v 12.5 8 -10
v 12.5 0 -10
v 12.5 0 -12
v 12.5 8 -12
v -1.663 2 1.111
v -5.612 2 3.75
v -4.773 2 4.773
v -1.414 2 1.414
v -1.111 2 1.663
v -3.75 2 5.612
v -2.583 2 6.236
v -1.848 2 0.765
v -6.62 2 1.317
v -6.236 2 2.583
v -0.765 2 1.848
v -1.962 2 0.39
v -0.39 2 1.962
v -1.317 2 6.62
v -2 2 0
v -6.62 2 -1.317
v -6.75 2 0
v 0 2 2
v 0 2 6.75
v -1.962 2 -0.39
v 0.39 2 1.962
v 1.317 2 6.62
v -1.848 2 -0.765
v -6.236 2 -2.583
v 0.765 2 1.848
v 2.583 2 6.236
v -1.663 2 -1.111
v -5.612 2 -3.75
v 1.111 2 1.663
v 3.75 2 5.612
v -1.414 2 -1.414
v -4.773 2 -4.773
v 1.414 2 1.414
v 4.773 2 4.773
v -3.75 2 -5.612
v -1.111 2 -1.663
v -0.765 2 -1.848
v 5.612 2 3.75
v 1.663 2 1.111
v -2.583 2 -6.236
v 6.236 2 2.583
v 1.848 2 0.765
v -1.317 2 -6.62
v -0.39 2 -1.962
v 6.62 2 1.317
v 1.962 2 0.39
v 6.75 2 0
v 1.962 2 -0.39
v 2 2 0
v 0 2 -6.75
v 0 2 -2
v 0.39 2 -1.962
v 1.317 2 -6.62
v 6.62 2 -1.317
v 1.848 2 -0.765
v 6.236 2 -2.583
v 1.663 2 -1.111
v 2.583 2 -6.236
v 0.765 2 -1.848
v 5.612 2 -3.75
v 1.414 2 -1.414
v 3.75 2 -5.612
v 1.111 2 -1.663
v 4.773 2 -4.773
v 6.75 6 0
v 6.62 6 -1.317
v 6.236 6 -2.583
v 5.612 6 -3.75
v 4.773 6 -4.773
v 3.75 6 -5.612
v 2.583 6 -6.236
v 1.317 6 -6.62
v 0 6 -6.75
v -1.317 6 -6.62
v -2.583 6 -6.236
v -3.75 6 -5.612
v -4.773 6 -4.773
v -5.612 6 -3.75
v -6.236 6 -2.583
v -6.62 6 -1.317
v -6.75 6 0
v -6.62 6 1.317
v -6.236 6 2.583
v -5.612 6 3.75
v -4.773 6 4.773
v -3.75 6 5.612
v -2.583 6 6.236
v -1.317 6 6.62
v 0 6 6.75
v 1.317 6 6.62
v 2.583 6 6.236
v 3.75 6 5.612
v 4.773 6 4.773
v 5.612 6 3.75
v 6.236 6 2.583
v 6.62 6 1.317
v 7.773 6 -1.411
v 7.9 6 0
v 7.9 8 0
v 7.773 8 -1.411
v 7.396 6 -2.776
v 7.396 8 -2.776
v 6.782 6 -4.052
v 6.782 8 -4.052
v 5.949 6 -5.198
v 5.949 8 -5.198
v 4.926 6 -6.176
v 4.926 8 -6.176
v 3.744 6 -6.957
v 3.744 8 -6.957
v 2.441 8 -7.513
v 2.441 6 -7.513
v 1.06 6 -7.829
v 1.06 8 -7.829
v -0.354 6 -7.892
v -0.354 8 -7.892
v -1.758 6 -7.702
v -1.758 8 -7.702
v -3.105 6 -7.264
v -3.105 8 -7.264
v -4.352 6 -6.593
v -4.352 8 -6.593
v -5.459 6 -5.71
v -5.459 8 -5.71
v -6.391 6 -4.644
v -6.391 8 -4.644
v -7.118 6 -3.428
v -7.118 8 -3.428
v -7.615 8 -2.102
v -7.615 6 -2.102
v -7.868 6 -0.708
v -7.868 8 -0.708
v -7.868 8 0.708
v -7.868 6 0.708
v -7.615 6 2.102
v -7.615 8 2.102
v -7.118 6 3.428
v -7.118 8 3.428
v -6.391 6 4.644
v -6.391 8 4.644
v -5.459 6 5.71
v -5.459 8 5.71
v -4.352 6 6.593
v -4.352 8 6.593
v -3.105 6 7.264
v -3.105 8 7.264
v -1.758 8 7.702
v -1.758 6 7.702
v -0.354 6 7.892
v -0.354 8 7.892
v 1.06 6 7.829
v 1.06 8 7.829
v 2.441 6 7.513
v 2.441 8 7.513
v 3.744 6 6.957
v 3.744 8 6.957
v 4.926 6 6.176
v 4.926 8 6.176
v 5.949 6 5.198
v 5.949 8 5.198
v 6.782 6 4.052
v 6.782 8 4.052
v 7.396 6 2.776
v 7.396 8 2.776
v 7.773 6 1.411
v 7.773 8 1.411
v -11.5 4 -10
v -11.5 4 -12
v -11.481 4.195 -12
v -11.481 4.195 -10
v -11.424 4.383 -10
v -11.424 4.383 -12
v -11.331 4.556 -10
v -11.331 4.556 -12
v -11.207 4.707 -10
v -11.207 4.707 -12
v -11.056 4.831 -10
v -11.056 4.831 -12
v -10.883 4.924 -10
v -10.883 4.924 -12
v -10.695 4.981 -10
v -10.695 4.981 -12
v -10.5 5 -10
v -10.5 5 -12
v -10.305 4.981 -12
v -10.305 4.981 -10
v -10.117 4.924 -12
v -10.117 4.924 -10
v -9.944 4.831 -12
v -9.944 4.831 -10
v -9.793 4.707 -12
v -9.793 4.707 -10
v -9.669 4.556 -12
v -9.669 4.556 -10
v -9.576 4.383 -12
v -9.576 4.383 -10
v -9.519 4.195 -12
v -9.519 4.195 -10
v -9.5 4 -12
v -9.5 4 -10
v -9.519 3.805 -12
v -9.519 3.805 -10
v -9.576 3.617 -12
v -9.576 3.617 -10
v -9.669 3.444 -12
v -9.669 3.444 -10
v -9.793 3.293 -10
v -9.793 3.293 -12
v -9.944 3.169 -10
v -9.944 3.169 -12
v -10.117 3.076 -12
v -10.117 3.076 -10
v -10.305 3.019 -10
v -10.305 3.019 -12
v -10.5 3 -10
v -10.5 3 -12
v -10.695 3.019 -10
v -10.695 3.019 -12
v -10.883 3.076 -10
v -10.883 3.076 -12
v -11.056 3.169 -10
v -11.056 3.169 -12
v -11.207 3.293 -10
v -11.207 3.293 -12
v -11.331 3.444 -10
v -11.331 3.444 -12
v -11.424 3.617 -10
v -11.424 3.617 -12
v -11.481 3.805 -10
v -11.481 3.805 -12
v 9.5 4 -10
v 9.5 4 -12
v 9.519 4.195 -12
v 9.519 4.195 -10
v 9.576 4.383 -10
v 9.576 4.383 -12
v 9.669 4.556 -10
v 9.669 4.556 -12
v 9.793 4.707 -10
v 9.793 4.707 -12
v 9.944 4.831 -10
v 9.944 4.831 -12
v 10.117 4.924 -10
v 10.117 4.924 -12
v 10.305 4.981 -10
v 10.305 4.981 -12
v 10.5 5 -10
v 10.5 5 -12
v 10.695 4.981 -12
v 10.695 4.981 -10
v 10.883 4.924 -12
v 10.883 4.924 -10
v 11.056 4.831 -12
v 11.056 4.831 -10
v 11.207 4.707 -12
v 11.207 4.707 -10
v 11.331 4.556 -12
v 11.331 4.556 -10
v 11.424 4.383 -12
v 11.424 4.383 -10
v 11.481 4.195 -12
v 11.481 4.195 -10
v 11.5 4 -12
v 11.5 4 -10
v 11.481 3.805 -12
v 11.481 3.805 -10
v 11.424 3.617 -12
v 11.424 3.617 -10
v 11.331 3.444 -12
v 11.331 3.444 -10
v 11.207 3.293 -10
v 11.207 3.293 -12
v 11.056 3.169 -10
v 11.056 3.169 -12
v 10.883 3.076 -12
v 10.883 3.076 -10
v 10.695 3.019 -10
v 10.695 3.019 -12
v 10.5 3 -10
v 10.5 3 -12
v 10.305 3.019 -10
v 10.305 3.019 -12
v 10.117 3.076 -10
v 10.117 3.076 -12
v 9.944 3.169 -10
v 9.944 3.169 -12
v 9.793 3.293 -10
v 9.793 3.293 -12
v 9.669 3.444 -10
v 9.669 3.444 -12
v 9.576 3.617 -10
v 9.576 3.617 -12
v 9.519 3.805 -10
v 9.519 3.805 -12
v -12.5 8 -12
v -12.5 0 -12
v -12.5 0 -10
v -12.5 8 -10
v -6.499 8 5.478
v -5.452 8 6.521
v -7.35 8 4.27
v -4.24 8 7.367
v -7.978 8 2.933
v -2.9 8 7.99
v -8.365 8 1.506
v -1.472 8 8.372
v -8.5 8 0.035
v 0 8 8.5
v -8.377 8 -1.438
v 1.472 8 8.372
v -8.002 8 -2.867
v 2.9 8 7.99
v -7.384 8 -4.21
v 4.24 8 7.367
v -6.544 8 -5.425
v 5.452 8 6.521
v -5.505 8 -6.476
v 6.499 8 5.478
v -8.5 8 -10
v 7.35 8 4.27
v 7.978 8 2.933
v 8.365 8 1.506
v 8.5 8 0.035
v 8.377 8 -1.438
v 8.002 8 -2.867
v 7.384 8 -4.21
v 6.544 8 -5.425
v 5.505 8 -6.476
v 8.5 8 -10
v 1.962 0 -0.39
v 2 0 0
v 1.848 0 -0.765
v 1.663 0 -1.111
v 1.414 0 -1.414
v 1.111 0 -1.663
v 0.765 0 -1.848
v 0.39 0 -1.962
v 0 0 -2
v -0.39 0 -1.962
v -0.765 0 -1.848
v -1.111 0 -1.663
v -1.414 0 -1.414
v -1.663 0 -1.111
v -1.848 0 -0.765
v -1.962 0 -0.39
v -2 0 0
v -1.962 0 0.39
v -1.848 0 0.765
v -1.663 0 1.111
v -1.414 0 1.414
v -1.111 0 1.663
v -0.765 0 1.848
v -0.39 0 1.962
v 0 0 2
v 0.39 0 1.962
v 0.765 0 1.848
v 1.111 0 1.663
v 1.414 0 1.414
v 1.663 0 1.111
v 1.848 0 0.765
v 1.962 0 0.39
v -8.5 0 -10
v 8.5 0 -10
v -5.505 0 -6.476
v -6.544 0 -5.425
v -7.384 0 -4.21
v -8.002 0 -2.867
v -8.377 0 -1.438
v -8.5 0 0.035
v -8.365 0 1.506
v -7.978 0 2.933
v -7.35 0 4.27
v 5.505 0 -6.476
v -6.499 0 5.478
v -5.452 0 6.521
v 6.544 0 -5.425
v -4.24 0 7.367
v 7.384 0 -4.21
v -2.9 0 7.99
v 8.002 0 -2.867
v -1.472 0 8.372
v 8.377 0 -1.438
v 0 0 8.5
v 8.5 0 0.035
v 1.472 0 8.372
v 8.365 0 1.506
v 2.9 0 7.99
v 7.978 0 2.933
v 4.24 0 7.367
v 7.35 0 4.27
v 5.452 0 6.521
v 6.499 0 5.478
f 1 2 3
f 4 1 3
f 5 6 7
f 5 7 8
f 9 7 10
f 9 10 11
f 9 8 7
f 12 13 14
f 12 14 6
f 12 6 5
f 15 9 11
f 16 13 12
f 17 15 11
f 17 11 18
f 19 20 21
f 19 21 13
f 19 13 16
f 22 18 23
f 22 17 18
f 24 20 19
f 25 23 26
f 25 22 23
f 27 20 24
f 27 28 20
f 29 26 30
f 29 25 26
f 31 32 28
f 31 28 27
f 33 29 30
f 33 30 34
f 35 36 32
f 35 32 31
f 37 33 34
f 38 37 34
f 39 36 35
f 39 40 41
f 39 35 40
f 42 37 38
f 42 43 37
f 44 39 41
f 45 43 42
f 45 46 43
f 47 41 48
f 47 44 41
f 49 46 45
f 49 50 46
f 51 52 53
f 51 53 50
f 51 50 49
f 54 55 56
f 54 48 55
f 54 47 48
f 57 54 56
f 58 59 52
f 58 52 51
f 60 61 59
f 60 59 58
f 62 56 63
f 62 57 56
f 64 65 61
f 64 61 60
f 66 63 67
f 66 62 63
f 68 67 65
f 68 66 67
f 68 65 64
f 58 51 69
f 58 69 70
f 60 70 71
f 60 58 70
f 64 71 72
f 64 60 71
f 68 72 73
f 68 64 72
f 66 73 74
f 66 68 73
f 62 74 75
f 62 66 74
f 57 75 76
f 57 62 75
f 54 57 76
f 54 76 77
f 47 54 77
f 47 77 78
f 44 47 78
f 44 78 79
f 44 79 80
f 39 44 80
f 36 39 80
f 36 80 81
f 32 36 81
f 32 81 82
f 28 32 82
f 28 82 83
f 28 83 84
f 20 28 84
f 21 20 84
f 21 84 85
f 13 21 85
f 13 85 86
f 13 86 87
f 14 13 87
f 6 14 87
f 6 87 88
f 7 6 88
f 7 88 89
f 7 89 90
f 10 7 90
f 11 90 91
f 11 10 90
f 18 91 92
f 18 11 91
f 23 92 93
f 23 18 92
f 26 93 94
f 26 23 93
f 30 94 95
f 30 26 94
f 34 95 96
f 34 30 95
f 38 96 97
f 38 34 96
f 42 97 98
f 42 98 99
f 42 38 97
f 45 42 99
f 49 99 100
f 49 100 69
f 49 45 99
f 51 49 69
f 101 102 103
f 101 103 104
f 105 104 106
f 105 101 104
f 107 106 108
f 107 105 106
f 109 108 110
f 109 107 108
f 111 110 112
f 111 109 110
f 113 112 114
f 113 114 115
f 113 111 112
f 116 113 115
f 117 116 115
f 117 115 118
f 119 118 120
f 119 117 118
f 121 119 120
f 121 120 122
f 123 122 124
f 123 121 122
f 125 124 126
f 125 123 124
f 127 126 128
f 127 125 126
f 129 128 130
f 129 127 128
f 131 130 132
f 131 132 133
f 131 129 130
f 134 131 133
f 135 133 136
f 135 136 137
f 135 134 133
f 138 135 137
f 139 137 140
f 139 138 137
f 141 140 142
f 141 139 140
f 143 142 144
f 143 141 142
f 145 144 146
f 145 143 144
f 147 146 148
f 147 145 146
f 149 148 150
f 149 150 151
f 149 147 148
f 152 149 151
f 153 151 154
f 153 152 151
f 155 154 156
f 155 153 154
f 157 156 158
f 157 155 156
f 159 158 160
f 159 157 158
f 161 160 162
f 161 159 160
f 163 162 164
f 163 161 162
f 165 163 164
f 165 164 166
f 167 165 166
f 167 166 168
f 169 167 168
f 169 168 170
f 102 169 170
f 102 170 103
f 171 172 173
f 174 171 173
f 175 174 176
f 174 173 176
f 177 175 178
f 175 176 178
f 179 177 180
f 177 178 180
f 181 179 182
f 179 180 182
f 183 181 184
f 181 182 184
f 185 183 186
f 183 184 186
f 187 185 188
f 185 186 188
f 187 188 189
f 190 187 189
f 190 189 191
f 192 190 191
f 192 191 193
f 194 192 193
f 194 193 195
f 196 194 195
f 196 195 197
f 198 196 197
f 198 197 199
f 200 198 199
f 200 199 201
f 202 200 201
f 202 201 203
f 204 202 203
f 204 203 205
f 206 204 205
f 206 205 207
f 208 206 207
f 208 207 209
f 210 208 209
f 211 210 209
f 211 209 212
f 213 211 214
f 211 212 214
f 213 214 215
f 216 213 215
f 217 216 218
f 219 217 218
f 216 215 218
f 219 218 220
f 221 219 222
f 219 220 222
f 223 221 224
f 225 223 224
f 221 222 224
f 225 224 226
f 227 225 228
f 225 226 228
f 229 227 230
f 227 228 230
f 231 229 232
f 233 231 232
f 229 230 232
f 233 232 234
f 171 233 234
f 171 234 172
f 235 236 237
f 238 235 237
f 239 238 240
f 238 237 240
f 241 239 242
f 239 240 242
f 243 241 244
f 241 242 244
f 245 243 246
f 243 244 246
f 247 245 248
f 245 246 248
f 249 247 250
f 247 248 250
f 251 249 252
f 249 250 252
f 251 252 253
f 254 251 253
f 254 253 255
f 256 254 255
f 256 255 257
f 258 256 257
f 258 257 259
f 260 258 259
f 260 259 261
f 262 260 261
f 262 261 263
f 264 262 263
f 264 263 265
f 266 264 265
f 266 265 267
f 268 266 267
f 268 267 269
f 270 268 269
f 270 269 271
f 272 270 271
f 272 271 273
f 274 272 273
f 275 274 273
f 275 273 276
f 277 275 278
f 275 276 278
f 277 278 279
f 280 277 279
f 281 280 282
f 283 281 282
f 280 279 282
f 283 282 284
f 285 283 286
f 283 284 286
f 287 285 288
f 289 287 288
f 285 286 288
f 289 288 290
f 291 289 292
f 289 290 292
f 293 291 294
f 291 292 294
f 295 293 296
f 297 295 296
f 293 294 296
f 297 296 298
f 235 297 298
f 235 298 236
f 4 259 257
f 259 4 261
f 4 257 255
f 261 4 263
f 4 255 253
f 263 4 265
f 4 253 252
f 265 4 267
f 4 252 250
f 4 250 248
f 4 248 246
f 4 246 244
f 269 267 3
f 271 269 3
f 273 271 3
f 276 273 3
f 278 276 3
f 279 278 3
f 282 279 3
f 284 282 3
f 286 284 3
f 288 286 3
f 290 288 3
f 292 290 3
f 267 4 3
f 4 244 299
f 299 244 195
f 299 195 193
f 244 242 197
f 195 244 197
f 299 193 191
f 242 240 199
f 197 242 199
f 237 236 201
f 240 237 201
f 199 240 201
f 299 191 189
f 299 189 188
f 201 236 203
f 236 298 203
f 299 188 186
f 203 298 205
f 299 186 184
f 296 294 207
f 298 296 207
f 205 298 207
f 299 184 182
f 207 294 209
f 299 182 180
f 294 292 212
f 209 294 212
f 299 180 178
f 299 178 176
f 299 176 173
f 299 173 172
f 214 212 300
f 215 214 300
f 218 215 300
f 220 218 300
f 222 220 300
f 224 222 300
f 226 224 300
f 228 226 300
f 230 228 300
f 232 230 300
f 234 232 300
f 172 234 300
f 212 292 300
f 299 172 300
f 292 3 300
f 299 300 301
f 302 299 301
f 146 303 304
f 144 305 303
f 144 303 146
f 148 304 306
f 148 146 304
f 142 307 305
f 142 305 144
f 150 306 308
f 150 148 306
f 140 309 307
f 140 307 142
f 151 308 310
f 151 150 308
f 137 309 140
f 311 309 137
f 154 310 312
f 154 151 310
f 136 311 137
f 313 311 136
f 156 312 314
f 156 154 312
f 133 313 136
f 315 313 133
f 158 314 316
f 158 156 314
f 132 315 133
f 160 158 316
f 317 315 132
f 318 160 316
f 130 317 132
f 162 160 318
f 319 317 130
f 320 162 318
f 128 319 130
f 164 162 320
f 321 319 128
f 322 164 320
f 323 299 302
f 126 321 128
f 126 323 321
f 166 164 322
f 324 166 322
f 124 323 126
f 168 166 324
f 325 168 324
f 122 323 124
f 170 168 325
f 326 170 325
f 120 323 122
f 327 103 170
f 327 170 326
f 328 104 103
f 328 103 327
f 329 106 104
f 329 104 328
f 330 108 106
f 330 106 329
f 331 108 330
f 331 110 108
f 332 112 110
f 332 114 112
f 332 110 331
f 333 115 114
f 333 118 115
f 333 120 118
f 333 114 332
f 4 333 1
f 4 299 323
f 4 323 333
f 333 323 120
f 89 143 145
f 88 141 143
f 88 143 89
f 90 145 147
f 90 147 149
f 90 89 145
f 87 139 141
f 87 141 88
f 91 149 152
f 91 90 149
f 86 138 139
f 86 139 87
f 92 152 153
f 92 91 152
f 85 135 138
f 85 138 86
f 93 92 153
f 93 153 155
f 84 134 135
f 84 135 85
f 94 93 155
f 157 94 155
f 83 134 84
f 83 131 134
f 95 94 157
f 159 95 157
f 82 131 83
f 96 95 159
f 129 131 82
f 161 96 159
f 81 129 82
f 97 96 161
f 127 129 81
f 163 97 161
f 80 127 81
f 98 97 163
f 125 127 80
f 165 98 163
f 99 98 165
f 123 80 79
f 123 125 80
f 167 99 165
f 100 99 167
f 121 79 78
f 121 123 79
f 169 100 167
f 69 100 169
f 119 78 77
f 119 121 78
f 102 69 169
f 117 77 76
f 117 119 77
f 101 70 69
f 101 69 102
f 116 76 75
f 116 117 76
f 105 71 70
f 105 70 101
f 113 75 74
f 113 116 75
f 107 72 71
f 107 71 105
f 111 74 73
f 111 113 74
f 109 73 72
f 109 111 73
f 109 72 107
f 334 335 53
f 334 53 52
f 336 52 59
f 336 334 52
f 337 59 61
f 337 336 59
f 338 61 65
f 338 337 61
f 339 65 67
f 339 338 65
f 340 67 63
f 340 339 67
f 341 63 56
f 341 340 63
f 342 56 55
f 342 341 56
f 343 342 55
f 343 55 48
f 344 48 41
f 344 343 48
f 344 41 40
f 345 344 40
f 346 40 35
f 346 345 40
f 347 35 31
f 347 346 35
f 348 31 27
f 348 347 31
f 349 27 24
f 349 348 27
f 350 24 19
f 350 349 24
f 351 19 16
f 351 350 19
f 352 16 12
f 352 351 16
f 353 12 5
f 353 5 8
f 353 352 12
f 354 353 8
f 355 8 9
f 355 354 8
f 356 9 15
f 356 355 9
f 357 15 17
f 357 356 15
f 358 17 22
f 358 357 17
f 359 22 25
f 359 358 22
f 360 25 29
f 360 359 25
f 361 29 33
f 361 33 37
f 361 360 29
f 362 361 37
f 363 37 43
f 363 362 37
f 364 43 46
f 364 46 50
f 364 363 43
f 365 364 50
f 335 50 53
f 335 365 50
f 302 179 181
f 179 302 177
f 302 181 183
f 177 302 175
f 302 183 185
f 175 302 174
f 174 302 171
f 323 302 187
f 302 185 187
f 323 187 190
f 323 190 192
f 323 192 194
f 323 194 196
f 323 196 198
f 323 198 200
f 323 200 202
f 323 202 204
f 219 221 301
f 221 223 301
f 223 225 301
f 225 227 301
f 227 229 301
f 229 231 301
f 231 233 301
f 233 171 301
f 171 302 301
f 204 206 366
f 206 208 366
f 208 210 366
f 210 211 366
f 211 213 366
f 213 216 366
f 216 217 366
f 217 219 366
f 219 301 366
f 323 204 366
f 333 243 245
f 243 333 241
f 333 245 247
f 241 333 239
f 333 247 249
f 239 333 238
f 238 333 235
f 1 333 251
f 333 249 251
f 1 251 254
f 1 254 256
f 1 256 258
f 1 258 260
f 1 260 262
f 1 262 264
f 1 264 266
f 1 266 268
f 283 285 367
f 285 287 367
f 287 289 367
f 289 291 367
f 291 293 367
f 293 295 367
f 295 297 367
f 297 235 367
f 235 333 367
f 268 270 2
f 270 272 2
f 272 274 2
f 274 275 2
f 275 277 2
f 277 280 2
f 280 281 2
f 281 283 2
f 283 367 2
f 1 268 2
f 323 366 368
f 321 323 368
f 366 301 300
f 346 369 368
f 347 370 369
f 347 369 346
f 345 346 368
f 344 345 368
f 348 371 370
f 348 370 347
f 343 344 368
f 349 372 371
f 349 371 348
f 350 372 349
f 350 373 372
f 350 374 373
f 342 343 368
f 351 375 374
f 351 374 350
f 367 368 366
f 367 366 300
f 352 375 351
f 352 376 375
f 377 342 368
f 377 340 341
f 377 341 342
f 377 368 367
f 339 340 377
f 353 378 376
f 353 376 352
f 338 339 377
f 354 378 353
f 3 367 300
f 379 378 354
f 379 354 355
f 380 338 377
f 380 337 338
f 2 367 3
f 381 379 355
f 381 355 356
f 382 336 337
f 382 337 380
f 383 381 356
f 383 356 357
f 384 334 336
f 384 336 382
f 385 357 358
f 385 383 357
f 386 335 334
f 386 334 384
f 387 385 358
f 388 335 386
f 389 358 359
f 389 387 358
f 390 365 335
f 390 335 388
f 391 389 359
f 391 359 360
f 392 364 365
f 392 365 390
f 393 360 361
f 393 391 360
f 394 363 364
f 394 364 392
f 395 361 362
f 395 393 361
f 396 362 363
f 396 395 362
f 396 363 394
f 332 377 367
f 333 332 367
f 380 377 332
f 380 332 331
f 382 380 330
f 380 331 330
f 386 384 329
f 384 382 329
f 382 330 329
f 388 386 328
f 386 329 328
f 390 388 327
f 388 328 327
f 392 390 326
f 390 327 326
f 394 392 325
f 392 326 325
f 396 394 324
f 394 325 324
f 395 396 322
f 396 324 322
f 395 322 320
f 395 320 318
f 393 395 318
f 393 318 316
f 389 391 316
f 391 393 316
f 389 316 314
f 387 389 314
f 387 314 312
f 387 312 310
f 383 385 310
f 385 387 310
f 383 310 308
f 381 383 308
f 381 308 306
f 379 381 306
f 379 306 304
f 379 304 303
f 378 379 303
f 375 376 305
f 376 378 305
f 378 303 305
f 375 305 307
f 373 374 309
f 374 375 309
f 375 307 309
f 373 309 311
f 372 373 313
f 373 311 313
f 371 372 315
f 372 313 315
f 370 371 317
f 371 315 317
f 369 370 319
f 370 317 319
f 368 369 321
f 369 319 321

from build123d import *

# Parameters (mm, degrees)
SKETCH_1_R          = 8
SKETCH_1_R_2        = 6.75
EXTRUDE_2_DEPTH     = 6
SKETCH_2_R          = 6.75
SKETCH_2_R_2        = 2
EXTRUDE_3_DEPTH     = 2
SKETCH_3_R          = 8.5
SKETCH_3_R_2        = 7.9
EXTRUDE_4_DEPTH     = 2
SKETCH_4_R          = 8.5
SKETCH_4_R_2        = 8
EXTRUDE_6_DEPTH     = 6
EXTRUDE_8_DEPTH     = 8
SKETCH_7_R          = 1
CUT_EXTRUDE_1_DEPTH = 8


with BuildPart() as part:
    # 草图1 → 凸台-拉伸2 (new body)
    with BuildSketch(Plane(origin=(0, 0, 0), x_dir=(1, 0, 0), z_dir=(0, 1, 0))):
        Circle(SKETCH_1_R)
        Circle(SKETCH_1_R_2, mode=Mode.SUBTRACT)
    extrude(amount=EXTRUDE_2_DEPTH)

    # 草图2 → 凸台-拉伸3 (add)
    with BuildSketch(Plane(origin=(0, 0, 0), x_dir=(1, 0, 0), z_dir=(0, 1, 0))):
        Circle(SKETCH_2_R)
        Circle(SKETCH_2_R_2, mode=Mode.SUBTRACT)
    extrude(amount=EXTRUDE_3_DEPTH)

    # 草图3 → 凸台-拉伸4 (add)
    with BuildSketch(Plane(origin=(0, 6, 0), x_dir=(1, 0, 0), z_dir=(0, 1, 0))):
        Circle(SKETCH_3_R)
        Circle(SKETCH_3_R_2, mode=Mode.SUBTRACT)
    extrude(amount=EXTRUDE_4_DEPTH)

    # 草图4 → 凸台-拉伸6 (add)
    with BuildSketch(Plane.XZ.offset(-6)):
        Circle(SKETCH_4_R)
        Circle(SKETCH_4_R_2, mode=Mode.SUBTRACT)
    extrude(amount=EXTRUDE_6_DEPTH)

    # 草图6 → 凸台-拉伸8 (add)
    with BuildSketch(Plane.XZ):
        with BuildLine():
            Line((-8.5, -10), (-5.505011571, -6.476484201))
            ThreePointArc((-5.505011571, -6.476484201), (0, -8.5), (5.505011571, -6.476484201))
            Line((5.505011571, -6.476484201), (8.5, -10))
            Line((8.5, -10), (12.5, -10))
            Line((12.5, -10), (12.5, -12))
            Line((12.5, -12), (0, -12))
            Line((0, -12), (-12.5, -12))
            Line((-12.5, -12), (-12.5, -10))
            Line((-12.5, -10), (-8.5, -10))
        make_face()
    extrude(amount=-EXTRUDE_8_DEPTH)

    # 草图7 → 切除-拉伸1 (cut)
    with BuildSketch(Plane(origin=(0, 0, -12), x_dir=(-1, 0, 0), z_dir=(0, 0, -1))):
        with Locations((10.5, 4)):
            Circle(SKETCH_7_R)
        with Locations((-10.5, 4)):
            Circle(SKETCH_7_R)
    extrude(amount=-CUT_EXTRUDE_1_DEPTH, mode=Mode.SUBTRACT)


solid = part.part
